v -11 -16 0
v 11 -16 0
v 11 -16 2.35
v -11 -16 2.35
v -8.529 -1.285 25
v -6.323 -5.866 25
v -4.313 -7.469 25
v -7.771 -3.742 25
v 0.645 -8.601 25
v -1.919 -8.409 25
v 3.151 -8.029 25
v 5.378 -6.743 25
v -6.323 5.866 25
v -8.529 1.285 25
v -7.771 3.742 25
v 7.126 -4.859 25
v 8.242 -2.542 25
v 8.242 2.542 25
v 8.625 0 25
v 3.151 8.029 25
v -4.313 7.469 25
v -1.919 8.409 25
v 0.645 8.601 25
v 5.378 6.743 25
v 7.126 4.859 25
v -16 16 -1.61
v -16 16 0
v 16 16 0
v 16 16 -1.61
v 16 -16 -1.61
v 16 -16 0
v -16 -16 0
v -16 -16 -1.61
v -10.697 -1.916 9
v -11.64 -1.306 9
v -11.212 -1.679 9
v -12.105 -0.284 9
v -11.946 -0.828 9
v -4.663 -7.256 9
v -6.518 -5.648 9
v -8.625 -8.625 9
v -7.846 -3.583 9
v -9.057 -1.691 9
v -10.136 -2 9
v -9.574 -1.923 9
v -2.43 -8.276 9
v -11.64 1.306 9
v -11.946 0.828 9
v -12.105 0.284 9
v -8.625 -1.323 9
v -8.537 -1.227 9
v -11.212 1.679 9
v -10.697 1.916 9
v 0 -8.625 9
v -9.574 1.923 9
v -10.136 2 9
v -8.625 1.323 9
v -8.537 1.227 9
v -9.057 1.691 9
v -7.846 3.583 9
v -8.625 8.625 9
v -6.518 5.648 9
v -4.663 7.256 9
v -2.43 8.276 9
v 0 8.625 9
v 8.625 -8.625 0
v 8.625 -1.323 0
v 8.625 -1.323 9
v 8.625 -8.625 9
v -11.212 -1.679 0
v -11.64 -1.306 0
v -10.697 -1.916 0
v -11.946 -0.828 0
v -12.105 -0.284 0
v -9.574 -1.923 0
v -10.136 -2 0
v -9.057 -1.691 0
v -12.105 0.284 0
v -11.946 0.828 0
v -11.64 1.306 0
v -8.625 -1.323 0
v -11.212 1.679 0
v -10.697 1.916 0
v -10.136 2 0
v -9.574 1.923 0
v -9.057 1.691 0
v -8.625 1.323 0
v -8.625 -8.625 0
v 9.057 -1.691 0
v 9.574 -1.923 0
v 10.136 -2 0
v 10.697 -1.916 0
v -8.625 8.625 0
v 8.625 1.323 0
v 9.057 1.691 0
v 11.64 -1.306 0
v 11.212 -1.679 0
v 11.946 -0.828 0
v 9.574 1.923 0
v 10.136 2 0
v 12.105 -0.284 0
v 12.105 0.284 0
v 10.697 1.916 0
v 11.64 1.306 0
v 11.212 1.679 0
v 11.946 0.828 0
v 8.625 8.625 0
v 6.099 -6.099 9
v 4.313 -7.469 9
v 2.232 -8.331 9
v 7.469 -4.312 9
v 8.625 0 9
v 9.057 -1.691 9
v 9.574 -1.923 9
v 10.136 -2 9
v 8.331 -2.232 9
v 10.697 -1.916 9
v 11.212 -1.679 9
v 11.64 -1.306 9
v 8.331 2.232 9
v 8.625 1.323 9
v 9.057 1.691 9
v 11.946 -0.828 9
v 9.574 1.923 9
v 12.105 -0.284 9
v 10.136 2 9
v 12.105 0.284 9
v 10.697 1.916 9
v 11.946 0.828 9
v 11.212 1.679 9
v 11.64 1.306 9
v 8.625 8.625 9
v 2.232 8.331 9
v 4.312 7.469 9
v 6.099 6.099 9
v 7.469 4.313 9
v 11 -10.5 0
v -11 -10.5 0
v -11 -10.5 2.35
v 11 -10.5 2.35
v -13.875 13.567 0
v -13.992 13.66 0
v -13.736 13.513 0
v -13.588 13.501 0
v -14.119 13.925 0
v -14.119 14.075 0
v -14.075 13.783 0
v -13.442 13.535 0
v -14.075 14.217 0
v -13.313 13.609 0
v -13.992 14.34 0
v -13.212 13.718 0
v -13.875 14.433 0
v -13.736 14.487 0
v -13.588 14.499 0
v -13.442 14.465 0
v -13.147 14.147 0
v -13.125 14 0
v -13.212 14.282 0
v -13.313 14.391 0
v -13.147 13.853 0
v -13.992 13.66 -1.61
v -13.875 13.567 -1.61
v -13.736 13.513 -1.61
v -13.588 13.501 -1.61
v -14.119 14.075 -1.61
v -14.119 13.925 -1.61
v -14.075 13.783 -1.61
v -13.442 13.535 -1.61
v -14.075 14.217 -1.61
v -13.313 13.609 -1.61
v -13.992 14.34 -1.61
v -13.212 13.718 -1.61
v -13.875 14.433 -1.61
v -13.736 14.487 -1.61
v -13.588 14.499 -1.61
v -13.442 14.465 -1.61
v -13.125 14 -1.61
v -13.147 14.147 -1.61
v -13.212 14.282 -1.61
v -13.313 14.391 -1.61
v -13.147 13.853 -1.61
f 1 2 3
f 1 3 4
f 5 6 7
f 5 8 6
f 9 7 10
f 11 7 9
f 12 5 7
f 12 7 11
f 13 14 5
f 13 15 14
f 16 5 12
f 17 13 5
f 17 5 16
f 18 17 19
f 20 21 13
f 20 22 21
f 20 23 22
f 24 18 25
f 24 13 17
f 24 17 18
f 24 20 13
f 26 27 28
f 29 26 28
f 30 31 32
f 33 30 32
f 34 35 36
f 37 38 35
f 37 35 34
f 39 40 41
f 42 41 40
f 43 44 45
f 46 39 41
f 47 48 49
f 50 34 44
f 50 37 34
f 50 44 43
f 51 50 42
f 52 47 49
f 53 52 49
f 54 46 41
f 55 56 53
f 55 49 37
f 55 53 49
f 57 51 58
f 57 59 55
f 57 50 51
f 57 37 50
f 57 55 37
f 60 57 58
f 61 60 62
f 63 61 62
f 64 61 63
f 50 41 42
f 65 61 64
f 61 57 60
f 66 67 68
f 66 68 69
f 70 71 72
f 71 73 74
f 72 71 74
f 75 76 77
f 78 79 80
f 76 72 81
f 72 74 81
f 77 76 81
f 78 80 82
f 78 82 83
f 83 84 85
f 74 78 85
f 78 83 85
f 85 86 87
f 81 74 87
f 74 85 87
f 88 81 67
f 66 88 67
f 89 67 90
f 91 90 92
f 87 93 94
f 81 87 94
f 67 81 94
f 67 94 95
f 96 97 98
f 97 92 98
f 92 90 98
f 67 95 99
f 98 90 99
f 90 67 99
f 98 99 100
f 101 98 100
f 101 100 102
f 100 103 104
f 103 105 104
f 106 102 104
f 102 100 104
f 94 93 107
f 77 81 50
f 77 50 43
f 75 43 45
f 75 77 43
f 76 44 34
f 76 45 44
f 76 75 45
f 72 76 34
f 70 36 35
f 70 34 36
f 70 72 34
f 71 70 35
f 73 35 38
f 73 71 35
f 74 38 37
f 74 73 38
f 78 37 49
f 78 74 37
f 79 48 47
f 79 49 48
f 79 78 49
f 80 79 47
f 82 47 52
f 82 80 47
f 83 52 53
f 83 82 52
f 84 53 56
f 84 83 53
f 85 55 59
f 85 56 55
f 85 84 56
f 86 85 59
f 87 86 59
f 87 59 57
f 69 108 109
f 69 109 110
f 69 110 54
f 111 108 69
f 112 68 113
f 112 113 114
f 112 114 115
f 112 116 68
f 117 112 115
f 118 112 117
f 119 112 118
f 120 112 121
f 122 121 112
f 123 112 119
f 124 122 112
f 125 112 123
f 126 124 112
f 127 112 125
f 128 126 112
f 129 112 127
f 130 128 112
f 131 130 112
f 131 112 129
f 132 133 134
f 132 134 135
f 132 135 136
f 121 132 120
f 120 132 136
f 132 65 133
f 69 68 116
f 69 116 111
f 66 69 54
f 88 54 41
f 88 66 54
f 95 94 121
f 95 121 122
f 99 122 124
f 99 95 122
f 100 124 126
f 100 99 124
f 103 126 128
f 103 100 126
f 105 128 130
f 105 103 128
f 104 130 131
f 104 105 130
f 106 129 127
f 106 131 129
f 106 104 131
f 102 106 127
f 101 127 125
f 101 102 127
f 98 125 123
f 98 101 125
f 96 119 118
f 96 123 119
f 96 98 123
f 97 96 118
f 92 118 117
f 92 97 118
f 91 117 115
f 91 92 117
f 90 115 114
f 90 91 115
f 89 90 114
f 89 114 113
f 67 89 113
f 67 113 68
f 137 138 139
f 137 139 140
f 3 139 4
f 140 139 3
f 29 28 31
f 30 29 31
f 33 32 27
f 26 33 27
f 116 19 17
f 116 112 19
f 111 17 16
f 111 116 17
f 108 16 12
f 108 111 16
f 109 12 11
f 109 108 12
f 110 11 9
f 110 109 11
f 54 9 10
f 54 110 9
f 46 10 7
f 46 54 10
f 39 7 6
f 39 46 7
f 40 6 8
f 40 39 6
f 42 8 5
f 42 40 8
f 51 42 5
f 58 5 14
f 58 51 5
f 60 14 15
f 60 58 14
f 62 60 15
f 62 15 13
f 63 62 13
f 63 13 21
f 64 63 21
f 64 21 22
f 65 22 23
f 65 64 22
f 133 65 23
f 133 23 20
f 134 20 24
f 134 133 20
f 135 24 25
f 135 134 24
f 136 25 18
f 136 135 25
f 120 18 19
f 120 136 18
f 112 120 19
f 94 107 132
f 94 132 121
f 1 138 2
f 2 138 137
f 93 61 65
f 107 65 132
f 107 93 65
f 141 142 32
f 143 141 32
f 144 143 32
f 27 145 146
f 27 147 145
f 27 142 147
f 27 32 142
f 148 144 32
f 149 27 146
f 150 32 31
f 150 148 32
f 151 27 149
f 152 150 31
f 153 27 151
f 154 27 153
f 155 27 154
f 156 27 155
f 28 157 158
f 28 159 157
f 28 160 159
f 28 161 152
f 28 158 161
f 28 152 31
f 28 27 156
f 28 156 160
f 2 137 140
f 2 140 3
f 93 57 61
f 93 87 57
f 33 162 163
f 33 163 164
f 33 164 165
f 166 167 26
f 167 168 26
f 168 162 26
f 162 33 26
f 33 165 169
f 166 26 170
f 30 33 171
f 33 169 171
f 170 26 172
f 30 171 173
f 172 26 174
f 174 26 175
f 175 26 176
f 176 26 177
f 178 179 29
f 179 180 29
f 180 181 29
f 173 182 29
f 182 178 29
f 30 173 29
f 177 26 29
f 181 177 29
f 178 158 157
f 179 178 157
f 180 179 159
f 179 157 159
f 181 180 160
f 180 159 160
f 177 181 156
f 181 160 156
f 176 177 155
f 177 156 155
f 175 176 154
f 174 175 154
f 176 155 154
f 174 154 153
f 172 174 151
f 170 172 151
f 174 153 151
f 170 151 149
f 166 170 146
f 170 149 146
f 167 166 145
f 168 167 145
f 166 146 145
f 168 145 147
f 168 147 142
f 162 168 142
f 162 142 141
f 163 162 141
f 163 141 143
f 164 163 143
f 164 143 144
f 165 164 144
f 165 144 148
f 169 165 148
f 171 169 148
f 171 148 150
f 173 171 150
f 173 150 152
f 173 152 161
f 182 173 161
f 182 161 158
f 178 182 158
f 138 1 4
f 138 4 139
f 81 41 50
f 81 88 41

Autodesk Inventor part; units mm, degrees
ref_plane "YZ Plane" through (0, 0, 0) normal (1, 0, 0) x (0, 1, 0)
ref_plane "XZ Plane" through (0, 0, 0) normal (0, 1, 0) x (-1, 0, 0)
ref_plane "XY Plane" through (0, 0, 0) normal (0, 0, 1) x (1, 0, 0)
sketch "Boceto1" plane through (0, 0, 0) normal (0, 0, 1) x (1, 0, 0)
  line L0 (-16, 16) -> (16, 16)
  line L1 (16, 16) -> (16, -16)
  line L2 (16, -16) -> (-16, -16)
  line L3 (-16, -16) -> (-16, 16)
  line L4 (-16, 0) -> (16, 0) construction
  line L5 (-11, -10.5) -> (11, -10.5)
  line L6 (11, -10.5) -> (11, -16)
  line L7 (11, -16) -> (-11, -16)
  line L8 (-11, -16) -> (-11, -10.5)
  line L9 (-8.625, 8.625) -> (8.625, 8.625)
  line L10 (8.625, 8.625) -> (8.625, -8.625)
  line L11 (8.625, -8.625) -> (-8.625, -8.625)
  line L12 (-8.625, -8.625) -> (-8.625, 8.625)
  line L13 (0, 0) -> (0, 8.625) construction
  circle A0 centre (10.125, 0) radius 2
  line L14 (0, 0) -> (10.125, 0) construction
  circle A1 centre (-10.125, 0) radius 2
  circle A2 centre (0, 0) radius 8.625
  circle A3 centre (-13.625, 14) radius 0.5
  point P0 (0, -16)
  point P1 (-8.625, 0)
  point P2 (-8.625, 1.3229)
  point P3 (-8.625, -1.3229)
  point P4 (8.625, -1.3229)
  point P5 (8.625, 1.3229)
  point P6 (-8.5386, 1.2179)
  point P7 (-8.5386, -1.2179)
  point P8 (8.5386, -1.2179)
  point P9 (8.5386, 1.2179)
  dimension "d0" = 32
  dimension "d1" = 22
  dimension "d2" = 5.5
  dimension "d3" = 17.25
  dimension "d4" = 4
  dimension "d6" = 1.5
  dimension "d7" = 1.5
  dimension "d16" = 13.625
  dimension "d17" = 2
  dimension "d18" = 1
extrude "Extrusión1" add sketch "Boceto1" along normal blind 9 contours L9 A2 A1 L12 | L9 L10 A0 A2 | A2 A0 A1 | A1 A2 L12 | L12 A1 | A2 A0 | A0 L10 A2 | A1 A2 | A2 A1 L12 | A1 A2 L11 L12 | A0 L10 | A2 L10 A0 | A0 L10 L11 A2
extrude "Extrusión2" add sketch "Boceto1" against normal blind 1.61 separate body contours L0 L1 L2 L6 L5 L8 L3 | L8 L5 L6 L2 | L9 A2 A1 L12 | L9 L10 A0 A2 | A2 A0 A1 | A1 A2 L12 | L12 A1 | A2 A0 | A0 L10 A2 | A1 A2 | A2 A1 L12 | A1 A2 L11 L12 | A0 L10 | A2 L10 A0 | A0 L10 L11 A2 | A3
extrude "Extrusión3" add sketch "Boceto1" along normal blind 2.35 separate body contours L8 L5 L6 L2
extrude "Extrusión4" add sketch "Boceto1" along normal blind 25 contours A2 A0 A1 | A2 A0 | A1 A2 bodies 1
extrude "Extrusión5" cut sketch "Boceto1" against normal blind 25 contours A3 bodies 2
equation "\"d7\" = d6"
properties part number "PiCam"
